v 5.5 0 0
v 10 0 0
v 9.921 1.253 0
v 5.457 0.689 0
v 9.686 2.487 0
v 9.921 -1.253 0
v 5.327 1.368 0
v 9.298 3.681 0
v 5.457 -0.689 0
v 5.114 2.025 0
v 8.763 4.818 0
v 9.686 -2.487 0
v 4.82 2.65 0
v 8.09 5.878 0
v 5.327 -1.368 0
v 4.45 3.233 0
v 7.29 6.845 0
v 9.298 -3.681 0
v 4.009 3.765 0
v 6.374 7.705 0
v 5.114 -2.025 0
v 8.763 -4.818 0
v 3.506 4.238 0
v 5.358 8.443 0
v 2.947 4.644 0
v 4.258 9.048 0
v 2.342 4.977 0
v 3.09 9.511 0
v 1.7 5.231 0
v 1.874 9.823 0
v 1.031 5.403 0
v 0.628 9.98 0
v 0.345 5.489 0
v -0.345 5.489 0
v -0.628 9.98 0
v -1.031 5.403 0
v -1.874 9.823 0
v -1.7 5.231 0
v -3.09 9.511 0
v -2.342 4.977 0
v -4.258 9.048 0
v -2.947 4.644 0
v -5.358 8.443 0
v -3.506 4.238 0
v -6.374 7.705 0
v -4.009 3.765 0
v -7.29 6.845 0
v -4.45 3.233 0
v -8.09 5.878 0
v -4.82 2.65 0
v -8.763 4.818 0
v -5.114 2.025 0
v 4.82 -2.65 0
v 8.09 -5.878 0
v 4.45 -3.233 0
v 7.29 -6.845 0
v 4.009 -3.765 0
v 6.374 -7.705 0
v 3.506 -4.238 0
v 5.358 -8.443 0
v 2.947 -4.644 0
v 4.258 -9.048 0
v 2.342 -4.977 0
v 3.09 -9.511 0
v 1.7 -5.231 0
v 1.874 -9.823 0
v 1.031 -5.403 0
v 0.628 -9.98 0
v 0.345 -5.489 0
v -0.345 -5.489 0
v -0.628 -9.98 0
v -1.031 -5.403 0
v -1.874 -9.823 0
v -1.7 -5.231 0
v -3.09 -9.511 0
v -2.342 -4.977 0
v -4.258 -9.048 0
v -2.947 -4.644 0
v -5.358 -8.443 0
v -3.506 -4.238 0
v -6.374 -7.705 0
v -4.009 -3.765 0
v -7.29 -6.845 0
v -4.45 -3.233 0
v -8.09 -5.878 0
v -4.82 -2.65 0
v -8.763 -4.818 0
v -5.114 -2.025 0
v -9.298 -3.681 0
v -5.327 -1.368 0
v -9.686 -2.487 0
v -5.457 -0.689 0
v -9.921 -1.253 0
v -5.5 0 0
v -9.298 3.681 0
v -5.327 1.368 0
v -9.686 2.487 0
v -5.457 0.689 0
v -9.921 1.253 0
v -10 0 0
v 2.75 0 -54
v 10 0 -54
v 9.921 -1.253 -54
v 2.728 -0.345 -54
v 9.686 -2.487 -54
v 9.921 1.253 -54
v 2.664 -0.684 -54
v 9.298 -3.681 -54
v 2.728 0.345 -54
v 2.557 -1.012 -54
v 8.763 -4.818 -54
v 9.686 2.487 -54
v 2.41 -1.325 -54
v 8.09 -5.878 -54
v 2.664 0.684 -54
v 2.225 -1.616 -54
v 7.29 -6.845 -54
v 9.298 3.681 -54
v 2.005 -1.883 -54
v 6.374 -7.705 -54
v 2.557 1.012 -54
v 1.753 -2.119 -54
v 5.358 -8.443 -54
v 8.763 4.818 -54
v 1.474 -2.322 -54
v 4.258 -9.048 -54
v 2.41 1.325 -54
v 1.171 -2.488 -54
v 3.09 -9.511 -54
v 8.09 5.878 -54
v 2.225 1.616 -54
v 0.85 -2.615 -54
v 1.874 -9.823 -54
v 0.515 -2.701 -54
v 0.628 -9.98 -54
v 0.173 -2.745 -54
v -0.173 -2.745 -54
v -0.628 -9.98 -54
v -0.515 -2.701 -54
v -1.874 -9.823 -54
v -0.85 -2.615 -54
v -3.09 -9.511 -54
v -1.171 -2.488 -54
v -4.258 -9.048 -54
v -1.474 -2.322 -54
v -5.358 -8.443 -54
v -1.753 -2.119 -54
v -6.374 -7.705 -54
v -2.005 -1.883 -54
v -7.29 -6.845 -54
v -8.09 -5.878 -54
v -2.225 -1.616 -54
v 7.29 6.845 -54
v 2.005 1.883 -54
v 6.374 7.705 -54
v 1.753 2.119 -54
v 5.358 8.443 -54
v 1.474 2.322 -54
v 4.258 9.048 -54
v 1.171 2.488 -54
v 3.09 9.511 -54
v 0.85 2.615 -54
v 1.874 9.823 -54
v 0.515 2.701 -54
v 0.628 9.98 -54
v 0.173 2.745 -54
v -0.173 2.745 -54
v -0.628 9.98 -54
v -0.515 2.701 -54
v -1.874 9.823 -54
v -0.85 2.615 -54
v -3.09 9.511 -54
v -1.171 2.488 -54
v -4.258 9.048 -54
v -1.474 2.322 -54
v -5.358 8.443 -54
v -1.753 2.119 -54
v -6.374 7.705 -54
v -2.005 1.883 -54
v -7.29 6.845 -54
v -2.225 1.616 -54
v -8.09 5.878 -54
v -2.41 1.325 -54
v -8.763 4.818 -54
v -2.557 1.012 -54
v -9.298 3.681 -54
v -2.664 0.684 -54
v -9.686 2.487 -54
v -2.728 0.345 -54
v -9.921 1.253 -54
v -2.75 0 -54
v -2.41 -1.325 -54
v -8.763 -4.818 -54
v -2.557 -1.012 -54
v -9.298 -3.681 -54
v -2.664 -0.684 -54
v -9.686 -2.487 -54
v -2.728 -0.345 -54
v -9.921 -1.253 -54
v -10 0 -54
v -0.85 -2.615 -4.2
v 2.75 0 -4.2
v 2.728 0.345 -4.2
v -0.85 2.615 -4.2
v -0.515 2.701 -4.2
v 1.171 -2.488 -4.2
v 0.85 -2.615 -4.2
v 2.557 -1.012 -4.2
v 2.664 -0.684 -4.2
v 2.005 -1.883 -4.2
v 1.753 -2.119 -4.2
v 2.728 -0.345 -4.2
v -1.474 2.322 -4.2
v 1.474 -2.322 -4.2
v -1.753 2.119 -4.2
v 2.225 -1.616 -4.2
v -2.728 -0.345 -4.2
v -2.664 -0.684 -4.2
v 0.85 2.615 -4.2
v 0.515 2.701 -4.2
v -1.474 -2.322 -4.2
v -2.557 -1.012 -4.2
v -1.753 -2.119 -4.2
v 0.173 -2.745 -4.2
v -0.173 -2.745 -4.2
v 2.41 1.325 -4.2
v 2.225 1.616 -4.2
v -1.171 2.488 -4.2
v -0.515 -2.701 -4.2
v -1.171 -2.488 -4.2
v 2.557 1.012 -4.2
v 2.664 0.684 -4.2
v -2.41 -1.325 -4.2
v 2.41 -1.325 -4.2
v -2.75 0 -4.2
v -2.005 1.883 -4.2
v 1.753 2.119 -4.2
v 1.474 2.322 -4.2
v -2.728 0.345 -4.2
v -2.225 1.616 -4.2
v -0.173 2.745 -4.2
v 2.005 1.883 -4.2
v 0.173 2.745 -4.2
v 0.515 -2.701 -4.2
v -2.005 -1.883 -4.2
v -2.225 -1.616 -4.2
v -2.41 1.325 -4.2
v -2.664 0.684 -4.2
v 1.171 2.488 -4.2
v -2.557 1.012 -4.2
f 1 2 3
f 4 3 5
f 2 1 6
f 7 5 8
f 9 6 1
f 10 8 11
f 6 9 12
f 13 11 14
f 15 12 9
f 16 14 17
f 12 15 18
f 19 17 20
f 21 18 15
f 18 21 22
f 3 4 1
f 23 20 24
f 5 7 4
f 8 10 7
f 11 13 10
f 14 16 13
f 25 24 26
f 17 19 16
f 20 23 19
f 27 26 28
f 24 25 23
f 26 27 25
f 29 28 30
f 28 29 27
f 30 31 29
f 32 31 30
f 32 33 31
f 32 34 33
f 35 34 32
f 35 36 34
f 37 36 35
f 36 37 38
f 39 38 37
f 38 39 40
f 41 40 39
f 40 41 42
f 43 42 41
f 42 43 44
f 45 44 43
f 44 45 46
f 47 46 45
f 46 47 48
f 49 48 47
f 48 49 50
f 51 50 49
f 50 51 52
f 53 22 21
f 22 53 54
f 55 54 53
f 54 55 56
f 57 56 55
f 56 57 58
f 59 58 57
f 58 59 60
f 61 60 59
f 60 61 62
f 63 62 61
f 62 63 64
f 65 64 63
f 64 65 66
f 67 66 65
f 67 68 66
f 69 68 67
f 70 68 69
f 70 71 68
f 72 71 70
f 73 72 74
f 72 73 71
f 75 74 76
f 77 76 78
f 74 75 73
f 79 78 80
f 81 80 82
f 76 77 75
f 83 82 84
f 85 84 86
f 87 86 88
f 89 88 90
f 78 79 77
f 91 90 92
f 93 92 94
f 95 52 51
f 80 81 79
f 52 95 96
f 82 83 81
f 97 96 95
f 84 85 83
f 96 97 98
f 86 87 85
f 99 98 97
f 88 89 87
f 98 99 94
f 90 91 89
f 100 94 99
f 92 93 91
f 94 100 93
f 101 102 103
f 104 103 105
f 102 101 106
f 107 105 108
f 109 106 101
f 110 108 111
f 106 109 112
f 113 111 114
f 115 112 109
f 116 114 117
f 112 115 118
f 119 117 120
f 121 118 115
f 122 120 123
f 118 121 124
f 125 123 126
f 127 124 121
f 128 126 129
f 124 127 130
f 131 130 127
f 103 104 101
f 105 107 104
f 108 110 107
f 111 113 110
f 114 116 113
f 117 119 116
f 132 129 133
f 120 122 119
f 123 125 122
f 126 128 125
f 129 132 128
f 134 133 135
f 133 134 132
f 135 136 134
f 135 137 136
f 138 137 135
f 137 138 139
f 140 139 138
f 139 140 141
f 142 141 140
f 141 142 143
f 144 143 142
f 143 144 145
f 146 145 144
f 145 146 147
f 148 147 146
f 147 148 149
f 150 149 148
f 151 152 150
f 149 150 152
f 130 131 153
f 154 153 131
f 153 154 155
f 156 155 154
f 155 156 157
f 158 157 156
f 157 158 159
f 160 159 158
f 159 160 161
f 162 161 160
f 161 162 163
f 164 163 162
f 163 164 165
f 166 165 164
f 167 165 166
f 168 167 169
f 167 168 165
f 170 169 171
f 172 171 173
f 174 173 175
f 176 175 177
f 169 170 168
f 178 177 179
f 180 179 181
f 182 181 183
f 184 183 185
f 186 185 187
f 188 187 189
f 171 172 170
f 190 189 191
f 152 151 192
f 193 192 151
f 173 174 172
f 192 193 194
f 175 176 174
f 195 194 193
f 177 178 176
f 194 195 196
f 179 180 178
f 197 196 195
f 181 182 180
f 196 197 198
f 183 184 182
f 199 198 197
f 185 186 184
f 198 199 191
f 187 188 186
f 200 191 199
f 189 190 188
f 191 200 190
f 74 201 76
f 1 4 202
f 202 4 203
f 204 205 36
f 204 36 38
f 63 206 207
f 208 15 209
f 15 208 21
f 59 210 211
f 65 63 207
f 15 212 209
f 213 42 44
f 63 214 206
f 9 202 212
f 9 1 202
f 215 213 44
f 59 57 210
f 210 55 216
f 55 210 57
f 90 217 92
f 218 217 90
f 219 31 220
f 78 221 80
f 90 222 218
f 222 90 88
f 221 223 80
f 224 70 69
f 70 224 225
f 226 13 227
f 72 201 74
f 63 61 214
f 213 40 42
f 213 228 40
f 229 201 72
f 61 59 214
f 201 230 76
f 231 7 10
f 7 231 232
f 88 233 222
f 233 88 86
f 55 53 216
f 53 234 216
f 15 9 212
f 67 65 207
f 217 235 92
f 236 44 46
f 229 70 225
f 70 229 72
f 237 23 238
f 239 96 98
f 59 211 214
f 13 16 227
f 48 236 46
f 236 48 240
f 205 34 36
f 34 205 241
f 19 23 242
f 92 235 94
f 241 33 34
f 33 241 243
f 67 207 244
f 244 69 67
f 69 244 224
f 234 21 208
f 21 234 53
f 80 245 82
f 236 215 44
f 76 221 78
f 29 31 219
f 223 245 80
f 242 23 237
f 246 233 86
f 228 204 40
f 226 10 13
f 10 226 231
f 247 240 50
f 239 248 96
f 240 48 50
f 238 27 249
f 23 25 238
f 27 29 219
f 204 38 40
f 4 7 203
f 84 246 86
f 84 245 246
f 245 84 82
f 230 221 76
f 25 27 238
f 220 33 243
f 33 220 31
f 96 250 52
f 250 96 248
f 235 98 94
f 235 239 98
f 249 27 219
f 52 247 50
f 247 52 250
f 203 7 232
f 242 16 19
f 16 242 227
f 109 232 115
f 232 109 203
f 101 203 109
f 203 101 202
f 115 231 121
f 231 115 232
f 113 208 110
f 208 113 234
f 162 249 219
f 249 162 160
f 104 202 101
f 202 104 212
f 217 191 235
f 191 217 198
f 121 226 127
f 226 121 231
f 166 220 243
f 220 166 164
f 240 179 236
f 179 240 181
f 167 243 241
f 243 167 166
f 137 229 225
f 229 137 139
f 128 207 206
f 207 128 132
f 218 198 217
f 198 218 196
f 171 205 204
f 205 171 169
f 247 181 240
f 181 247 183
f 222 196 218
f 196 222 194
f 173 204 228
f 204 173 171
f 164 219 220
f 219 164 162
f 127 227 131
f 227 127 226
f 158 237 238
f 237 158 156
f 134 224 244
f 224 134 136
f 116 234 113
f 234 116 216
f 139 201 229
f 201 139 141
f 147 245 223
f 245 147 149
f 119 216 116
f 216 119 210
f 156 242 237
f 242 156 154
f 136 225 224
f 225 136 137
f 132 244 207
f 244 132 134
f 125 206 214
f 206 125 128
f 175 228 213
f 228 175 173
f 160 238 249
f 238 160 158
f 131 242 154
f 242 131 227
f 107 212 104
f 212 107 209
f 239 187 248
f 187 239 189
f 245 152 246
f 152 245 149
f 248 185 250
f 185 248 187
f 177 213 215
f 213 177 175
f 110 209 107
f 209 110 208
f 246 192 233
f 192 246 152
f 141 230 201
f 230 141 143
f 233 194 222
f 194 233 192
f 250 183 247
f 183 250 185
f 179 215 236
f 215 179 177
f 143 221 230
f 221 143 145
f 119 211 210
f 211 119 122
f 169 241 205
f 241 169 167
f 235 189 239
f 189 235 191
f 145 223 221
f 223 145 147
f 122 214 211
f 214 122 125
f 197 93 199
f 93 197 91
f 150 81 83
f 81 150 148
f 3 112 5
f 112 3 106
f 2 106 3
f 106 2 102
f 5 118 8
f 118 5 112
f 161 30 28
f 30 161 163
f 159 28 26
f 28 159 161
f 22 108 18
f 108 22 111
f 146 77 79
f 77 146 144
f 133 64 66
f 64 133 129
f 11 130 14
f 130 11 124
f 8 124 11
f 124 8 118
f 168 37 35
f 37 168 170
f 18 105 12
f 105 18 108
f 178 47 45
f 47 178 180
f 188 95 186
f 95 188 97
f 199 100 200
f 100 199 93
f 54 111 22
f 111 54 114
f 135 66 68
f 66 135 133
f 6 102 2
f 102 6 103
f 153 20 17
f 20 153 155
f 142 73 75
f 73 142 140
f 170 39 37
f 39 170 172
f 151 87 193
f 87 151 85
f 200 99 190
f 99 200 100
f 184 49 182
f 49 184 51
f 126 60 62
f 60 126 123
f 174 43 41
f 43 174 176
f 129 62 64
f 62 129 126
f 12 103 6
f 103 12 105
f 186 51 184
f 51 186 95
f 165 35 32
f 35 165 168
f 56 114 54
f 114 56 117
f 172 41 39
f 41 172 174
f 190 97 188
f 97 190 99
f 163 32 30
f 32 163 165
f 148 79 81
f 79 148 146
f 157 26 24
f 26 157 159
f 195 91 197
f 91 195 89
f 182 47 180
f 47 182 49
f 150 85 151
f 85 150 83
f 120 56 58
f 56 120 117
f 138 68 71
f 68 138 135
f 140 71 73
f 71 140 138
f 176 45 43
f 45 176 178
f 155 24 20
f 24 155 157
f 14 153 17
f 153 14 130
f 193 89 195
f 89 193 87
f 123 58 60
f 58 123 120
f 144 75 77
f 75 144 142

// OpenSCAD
$fn = 50;


difference() {
	union() {
		translate(v = [0, 0, -54.0000000000]) {
			cylinder(h = 54, r = 10.0000000000);
		}
		cylinder(h = 0, r = 20.0000000000);
	}
	union() {
		translate(v = [0, 0, 0]) {
			rotate(a = [0, 0, 0]) {
				difference() {
					union() {
						#translate(v = [0, 0, -54.0000000000]) {
							cylinder(h = 54, r = 2.2500000000);
						}
						#translate(v = [0, 0, -4.2000000000]) {
							cylinder(h = 4.2000000000, r1 = 2.7500000000, r2 = 5.5000000000);
						}
						#translate(v = [0, 0, -54.0000000000]) {
							cylinder(h = 54, r = 2.7500000000);
						}
						#translate(v = [0, 0, -54.0000000000]) {
							cylinder(h = 54, r = 2.2500000000);
						}
					}
					union();
				}
			}
		}
	}
}
